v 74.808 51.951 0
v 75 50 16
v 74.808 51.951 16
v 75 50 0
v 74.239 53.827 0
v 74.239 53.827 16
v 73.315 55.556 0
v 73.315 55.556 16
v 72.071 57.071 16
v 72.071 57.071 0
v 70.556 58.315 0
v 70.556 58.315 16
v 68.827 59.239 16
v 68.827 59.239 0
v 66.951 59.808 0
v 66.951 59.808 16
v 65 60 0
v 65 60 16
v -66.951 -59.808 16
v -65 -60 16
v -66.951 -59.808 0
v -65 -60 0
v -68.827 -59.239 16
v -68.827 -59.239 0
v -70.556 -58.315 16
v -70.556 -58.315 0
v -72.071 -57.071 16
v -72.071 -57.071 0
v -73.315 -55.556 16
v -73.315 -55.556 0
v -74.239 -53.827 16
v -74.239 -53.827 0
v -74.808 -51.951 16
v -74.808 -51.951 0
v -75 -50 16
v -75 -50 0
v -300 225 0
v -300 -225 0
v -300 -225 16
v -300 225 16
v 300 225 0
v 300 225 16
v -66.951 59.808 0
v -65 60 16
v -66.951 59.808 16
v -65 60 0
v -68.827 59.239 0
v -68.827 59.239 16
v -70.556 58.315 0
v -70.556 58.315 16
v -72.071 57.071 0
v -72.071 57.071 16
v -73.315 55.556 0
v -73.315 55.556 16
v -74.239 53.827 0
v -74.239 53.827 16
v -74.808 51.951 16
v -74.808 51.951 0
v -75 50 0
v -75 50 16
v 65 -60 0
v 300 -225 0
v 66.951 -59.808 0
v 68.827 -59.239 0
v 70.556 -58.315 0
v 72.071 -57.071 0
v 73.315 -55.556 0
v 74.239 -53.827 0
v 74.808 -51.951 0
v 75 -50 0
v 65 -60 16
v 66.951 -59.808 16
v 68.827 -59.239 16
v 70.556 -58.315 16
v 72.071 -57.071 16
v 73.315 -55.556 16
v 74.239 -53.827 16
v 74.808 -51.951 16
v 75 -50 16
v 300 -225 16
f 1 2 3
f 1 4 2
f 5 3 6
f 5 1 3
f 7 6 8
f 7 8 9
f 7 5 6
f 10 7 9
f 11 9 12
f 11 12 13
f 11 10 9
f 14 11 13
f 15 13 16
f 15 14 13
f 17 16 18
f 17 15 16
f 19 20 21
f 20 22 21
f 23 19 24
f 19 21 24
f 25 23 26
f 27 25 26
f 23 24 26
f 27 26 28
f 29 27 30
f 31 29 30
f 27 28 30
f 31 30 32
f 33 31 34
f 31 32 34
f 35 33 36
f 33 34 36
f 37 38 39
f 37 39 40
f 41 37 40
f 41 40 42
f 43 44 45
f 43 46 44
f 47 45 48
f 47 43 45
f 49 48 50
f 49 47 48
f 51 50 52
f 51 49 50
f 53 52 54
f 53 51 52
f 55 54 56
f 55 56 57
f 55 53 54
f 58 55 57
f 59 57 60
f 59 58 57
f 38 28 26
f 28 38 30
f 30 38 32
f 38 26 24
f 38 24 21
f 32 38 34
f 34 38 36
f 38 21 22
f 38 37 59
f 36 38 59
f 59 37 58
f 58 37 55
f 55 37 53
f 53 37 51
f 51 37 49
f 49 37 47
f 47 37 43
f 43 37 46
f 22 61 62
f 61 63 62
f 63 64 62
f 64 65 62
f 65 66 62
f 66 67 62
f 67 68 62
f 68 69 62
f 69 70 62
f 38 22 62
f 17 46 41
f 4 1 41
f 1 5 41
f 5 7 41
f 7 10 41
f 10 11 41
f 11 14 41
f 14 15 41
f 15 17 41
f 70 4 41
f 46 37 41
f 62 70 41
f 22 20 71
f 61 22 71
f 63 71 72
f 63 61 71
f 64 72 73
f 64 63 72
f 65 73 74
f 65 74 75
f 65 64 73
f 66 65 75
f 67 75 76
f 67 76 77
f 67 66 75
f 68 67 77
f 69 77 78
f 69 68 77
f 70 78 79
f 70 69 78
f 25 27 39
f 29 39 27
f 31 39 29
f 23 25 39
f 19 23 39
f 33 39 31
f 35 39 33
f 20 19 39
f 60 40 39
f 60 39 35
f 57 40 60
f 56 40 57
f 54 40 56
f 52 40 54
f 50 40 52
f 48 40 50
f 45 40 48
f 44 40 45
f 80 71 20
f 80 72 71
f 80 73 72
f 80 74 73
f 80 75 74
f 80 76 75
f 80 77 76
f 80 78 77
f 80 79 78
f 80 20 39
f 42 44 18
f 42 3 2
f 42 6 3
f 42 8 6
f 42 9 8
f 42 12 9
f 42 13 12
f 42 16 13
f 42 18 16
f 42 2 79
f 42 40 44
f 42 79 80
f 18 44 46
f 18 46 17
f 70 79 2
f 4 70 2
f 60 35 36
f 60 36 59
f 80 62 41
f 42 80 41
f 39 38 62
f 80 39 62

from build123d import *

# Parameters (mm, degrees)
F0_W     = 600
F0_H     = 450
F1_DEPTH = 16
F2_W     = 150
F2_H     = 120
F3_DEPTH = 16.001
F4_R     = 10


with BuildPart() as f1:
    # F0 (on Top) → F1 (new body)
    with BuildSketch(Plane.XY):
        Rectangle(F0_W, F0_H)
    extrude(amount=F1_DEPTH)

    # F2 (on face) → F3 (cut, through all)
    with BuildSketch(Plane.XY.offset(16)):
        Rectangle(F2_W, F2_H)
    extrude(amount=-F3_DEPTH, mode=Mode.SUBTRACT)

    # F4
    f4_edges = [f1.edges().sort_by_distance(p)[0] for p in [
        (-75, 60, 8),
        (75, 60, 8),
        (75, -60, 8),
        (-75, -60, 8),
    ]]
    fillet(f4_edges, radius=F4_R)


solid = f1.part
